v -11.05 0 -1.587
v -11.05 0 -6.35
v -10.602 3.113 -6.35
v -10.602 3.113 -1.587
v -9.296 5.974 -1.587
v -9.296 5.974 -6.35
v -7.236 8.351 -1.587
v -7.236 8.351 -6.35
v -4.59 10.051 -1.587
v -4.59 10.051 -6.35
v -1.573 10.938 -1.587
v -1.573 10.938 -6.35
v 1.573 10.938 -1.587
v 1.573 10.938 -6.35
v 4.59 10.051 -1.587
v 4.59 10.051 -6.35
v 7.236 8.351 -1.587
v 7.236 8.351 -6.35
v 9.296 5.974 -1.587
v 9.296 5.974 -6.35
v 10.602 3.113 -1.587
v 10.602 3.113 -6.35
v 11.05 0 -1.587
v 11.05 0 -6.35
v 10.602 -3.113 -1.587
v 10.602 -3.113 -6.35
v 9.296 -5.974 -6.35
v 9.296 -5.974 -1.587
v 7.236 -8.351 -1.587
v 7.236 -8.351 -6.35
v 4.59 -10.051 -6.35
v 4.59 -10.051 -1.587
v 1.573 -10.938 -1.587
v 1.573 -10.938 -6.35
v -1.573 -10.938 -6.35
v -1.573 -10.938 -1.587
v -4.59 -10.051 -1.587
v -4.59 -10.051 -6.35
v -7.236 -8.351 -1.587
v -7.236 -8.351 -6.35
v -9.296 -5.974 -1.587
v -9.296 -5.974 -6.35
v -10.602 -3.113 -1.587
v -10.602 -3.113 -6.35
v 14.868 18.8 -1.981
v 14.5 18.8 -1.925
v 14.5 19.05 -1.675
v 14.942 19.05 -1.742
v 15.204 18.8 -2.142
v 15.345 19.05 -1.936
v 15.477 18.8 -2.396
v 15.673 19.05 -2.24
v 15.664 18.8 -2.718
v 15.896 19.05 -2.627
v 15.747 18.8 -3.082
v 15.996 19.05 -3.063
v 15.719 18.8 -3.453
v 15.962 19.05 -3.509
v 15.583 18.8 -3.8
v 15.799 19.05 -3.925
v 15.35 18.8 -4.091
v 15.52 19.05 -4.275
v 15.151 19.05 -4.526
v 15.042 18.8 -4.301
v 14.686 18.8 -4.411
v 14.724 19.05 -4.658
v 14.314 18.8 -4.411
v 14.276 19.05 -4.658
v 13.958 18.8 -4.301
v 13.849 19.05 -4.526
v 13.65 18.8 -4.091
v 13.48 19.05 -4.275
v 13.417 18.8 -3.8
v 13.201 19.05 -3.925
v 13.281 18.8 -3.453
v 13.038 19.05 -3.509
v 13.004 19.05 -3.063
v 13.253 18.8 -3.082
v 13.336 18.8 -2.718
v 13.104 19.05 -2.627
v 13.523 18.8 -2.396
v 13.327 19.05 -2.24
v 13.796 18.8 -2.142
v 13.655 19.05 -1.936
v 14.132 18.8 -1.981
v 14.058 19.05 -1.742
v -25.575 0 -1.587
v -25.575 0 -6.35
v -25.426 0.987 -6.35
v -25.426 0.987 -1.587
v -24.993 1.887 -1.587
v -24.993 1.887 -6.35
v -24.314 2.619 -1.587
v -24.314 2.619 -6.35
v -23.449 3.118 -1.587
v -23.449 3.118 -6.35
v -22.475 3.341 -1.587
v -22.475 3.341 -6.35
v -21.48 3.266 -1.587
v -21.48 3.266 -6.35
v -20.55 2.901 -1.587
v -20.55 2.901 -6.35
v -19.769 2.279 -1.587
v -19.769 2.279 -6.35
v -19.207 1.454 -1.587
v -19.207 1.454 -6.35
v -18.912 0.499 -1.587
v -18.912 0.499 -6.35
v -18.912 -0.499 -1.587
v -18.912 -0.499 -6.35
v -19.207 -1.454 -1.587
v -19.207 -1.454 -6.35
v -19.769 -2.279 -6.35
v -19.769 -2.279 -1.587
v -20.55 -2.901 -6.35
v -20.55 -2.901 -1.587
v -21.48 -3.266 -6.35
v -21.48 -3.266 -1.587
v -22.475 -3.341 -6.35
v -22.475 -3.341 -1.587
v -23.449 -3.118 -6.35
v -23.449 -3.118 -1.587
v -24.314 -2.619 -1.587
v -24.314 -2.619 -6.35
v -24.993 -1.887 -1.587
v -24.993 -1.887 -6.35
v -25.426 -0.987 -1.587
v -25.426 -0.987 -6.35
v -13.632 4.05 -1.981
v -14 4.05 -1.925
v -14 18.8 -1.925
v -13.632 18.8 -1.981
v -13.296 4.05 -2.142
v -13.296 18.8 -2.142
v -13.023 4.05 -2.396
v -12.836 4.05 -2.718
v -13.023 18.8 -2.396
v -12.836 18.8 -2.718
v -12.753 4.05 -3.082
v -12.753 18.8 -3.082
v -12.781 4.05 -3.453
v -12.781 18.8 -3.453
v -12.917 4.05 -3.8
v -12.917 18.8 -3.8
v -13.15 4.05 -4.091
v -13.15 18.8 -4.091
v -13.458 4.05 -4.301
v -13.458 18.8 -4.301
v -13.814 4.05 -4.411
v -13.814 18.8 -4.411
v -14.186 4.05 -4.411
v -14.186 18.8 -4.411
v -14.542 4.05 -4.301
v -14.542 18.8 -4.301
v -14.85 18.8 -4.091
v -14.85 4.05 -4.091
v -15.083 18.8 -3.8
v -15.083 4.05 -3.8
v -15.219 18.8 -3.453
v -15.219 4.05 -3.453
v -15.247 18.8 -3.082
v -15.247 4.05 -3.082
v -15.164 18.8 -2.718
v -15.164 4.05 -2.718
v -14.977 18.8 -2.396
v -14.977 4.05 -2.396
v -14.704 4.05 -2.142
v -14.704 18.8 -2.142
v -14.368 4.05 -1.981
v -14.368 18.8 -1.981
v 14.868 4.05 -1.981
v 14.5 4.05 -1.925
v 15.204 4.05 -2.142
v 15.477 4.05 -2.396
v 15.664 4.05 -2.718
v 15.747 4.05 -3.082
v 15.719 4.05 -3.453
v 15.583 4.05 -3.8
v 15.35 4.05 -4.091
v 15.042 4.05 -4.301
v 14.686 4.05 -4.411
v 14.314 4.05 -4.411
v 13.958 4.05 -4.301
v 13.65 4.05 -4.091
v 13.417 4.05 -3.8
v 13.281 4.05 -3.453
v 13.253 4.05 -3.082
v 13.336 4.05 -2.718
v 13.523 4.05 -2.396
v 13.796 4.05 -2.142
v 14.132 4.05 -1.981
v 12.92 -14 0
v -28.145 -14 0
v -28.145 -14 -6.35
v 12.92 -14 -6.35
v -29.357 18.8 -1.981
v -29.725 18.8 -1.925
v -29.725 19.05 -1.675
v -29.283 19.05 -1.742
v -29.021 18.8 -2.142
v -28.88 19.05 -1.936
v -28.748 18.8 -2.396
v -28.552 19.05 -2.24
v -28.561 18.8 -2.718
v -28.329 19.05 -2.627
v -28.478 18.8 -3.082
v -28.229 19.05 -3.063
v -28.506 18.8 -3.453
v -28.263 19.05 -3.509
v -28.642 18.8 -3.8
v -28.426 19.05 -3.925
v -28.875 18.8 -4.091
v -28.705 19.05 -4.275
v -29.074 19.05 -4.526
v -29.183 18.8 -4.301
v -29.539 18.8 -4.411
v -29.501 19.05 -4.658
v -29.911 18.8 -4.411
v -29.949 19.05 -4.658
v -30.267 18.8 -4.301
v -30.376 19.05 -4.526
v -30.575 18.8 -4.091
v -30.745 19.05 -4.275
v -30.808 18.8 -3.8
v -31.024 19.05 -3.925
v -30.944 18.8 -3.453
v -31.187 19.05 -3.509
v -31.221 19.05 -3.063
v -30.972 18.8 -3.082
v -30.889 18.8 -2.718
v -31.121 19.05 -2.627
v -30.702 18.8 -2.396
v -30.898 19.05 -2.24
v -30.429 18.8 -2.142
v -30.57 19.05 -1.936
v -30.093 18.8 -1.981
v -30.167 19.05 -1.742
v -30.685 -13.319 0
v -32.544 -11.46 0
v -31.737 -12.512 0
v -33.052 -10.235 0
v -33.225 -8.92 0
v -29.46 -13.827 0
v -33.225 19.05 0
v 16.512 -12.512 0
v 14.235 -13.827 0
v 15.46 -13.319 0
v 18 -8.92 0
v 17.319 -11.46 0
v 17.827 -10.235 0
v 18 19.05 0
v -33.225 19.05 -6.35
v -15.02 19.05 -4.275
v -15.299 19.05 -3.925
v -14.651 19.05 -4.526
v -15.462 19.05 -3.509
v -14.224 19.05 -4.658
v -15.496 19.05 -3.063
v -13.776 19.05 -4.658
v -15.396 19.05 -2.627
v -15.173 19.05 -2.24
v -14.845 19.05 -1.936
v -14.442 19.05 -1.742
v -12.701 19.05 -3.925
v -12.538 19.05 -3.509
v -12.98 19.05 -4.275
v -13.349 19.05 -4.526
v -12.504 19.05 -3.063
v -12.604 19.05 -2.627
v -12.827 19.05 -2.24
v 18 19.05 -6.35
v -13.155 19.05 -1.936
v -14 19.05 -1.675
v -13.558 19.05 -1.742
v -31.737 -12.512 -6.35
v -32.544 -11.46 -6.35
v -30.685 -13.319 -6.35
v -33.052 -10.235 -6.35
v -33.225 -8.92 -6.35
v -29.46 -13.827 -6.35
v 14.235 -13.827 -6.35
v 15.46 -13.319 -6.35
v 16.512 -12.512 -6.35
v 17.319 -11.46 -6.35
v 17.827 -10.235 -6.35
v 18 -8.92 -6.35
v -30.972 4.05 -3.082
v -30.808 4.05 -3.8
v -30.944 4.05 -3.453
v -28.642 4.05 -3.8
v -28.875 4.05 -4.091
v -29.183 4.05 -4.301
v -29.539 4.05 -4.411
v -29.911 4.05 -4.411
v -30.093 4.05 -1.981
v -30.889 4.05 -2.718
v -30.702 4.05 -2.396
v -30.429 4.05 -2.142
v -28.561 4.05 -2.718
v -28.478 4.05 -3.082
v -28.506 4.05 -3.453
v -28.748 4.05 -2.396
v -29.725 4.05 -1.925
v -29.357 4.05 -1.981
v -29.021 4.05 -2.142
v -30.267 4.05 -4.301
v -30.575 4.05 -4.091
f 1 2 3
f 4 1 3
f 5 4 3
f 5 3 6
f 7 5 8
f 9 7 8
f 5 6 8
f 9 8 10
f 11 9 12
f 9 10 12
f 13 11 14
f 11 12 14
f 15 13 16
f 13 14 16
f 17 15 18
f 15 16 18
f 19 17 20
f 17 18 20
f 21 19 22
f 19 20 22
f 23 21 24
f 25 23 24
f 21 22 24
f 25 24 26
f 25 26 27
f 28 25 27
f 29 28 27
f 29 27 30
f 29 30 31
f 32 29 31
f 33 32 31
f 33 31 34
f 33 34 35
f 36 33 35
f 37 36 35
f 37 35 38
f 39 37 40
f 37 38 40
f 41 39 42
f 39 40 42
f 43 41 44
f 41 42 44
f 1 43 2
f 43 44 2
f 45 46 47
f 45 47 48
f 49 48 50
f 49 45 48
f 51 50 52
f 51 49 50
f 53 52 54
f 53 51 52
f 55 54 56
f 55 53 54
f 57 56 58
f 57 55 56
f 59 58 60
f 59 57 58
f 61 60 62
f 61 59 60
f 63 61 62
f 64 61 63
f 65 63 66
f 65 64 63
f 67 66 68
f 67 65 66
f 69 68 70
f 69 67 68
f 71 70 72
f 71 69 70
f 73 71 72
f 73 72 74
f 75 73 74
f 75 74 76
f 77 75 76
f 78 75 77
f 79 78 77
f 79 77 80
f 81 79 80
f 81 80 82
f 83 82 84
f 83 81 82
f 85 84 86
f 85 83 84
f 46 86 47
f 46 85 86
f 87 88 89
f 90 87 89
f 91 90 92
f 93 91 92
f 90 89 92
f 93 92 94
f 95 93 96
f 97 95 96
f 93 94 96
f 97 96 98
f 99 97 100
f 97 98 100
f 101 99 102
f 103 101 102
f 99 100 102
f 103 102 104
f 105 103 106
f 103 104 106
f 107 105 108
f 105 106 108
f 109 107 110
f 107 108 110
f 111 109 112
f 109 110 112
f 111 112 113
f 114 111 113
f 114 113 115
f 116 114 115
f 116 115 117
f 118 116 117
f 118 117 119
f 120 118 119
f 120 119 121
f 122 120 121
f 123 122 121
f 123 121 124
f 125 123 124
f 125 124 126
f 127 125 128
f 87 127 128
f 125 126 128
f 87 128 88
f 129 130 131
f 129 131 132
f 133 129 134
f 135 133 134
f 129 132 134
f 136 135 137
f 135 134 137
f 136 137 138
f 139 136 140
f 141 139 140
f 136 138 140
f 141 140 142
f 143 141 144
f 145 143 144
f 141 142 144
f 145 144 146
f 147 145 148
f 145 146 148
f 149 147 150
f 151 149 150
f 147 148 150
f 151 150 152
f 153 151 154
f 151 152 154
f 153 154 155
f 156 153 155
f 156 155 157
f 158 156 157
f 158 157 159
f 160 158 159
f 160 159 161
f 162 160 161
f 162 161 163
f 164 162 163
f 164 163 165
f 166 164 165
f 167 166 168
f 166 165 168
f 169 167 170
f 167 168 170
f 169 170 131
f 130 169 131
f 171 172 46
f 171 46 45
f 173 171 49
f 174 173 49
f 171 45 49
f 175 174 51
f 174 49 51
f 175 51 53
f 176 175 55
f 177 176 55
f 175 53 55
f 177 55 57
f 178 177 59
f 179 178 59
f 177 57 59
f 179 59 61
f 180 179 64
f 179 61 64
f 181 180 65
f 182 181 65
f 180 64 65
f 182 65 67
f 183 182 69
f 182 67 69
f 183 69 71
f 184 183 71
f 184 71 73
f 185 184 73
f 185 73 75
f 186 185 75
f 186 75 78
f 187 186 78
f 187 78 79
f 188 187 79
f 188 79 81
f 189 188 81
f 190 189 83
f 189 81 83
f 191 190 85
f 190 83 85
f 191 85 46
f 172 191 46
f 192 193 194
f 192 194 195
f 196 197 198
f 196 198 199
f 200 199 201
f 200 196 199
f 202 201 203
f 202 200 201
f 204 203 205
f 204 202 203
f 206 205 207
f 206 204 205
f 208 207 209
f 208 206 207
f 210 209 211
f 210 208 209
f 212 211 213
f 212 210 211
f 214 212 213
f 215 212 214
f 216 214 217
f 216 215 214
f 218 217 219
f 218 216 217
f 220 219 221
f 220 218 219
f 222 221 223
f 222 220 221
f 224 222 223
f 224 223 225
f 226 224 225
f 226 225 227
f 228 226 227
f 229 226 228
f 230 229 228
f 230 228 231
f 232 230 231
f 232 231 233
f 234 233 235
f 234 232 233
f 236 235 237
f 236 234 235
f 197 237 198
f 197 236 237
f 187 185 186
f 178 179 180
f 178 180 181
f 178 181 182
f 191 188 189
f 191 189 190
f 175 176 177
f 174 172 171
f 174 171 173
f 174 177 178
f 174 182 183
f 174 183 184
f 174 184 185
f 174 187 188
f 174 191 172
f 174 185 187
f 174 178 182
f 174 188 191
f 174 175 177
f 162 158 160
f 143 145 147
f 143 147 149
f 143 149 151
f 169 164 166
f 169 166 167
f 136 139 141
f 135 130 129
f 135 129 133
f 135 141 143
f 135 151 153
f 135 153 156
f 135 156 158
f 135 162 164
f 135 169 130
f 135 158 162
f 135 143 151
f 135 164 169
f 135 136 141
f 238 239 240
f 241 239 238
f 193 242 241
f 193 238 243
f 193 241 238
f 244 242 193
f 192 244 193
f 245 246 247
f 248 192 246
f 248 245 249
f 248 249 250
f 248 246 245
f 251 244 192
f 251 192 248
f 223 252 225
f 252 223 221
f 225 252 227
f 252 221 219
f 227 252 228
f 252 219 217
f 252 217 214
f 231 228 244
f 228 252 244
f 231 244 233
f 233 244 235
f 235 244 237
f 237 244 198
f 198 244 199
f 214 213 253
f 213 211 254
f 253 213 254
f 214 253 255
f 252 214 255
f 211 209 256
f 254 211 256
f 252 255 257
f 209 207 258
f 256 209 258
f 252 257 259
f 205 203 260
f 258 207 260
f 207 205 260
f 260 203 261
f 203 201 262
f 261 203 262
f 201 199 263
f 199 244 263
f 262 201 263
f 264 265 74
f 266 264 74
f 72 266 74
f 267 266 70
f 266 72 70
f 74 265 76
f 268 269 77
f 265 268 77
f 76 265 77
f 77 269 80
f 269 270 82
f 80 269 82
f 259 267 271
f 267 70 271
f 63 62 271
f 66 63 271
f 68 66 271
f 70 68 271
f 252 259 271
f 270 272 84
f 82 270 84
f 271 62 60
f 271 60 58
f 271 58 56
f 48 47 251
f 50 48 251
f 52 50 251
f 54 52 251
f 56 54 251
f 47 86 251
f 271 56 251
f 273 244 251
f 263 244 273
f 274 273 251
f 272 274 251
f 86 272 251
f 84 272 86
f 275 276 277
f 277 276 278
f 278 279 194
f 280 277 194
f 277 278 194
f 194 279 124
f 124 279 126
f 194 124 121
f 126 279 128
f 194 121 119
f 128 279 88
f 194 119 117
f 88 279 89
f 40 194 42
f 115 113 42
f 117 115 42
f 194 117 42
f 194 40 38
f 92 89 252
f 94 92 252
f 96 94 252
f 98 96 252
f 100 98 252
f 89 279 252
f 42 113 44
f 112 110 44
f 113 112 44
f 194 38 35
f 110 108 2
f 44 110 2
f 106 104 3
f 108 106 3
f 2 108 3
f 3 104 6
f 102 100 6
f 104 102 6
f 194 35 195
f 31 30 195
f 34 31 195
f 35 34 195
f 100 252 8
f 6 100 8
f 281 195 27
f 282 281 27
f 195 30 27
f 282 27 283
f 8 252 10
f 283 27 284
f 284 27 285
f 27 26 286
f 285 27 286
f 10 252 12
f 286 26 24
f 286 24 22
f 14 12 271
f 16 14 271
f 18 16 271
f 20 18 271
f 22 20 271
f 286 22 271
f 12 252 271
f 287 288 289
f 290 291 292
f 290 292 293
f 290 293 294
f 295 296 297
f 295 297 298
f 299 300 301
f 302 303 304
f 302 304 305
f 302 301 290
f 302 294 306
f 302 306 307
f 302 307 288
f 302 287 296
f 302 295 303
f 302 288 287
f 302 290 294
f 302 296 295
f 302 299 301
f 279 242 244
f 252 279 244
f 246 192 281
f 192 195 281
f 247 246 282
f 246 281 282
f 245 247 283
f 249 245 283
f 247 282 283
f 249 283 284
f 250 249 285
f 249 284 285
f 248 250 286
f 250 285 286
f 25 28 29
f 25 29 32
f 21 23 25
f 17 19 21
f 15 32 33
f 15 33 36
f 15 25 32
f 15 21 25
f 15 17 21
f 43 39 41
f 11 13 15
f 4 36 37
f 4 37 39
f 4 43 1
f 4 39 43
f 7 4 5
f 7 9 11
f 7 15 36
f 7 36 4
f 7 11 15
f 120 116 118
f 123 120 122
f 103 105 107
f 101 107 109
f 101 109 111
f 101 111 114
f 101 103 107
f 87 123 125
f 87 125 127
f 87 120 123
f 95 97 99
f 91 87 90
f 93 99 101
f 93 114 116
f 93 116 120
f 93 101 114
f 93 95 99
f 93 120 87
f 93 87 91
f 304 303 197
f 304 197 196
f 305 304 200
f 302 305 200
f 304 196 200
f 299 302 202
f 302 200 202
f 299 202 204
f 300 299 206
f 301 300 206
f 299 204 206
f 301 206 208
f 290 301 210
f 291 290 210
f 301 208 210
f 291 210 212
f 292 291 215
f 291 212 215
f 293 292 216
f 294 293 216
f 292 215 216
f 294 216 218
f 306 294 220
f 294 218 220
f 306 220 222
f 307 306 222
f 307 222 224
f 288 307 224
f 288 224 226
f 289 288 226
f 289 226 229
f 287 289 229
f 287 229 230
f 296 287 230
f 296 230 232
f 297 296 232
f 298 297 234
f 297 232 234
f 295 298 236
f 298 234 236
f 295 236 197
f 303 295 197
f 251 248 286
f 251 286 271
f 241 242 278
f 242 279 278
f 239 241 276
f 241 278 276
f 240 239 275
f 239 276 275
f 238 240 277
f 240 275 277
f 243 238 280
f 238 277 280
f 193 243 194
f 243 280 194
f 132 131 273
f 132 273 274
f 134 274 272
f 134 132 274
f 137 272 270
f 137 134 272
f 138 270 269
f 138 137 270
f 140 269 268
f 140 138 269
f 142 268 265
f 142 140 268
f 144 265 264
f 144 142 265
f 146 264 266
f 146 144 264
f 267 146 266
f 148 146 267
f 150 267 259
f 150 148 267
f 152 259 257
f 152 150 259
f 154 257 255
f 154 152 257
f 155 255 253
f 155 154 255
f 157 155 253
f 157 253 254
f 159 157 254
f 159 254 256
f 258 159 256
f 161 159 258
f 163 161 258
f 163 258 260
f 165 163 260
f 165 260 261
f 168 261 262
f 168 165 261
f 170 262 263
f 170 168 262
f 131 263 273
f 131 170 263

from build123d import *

# Parameters (mm, degrees)
SKETCH1_W           = 51.225
SKETCH1_H           = 33.05
BOSS_EXTRUDE1_DEPTH = 6.35
SKETCH8_R           = 1.25
CUT_EXTRUDE4_DEPTH  = 15
FILLET3_R           = 5.08
SKETCH10_R          = 3.35
SKETCH10_R_2        = 11.05
CUT_EXTRUDE5_DEPTH  = 4.7625
CHAMFER1_SIZE       = 0.25


with BuildPart() as part:
    # Sketch1 → Boss-Extrude1 (new body)
    with BuildSketch(Plane.XY):
        with Locations((-7.6125, 2.525)):
            Rectangle(SKETCH1_W, SKETCH1_H)
    extrude(amount=-BOSS_EXTRUDE1_DEPTH)

    # Sketch8 → Cut-Extrude4 (cut)
    with BuildSketch(Plane(origin=(0, 19.05, 0), x_dir=(1, 0, 0), z_dir=(0, 1, 0))):
        with Locations(Location((-29.725, 3.175, 0), (0, 0, 270))):
            Circle(SKETCH8_R)
        with Locations(Location((-14, 3.175, 0), (0, 0, 270))):
            Circle(SKETCH8_R)
        with Locations(Location((14.5, 3.175, 0), (0, 0, 270))):
            Circle(SKETCH8_R)
    extrude(amount=-CUT_EXTRUDE4_DEPTH, mode=Mode.SUBTRACT)

    # Fillet3
    fillet3_edges = [part.edges().sort_by_distance(p)[0] for p in [
        (18, -14, -3.175),
        (-33.225, -14, -3.175),
    ]]
    fillet(fillet3_edges, radius=FILLET3_R)

    # Sketch10 → Cut-Extrude5 (cut)
    with BuildSketch(Plane(origin=(0, 0, -6.35), x_dir=(-1, 0, 0), z_dir=(0, 0, -1))):
        with Locations((22.225, 0)):
            Circle(SKETCH10_R)
        Circle(SKETCH10_R_2)
    extrude(amount=-CUT_EXTRUDE5_DEPTH, mode=Mode.SUBTRACT)

    # Chamfer1
    chamfer1_edges = [part.edges().sort_by_distance(p)[0] for p in [
        (-29.725, 19.05, -4.425),
        (-14, 19.05, -4.425),
        (14.5, 19.05, -4.425),
    ]]
    chamfer(chamfer1_edges, length=CHAMFER1_SIZE)


solid = part.part
